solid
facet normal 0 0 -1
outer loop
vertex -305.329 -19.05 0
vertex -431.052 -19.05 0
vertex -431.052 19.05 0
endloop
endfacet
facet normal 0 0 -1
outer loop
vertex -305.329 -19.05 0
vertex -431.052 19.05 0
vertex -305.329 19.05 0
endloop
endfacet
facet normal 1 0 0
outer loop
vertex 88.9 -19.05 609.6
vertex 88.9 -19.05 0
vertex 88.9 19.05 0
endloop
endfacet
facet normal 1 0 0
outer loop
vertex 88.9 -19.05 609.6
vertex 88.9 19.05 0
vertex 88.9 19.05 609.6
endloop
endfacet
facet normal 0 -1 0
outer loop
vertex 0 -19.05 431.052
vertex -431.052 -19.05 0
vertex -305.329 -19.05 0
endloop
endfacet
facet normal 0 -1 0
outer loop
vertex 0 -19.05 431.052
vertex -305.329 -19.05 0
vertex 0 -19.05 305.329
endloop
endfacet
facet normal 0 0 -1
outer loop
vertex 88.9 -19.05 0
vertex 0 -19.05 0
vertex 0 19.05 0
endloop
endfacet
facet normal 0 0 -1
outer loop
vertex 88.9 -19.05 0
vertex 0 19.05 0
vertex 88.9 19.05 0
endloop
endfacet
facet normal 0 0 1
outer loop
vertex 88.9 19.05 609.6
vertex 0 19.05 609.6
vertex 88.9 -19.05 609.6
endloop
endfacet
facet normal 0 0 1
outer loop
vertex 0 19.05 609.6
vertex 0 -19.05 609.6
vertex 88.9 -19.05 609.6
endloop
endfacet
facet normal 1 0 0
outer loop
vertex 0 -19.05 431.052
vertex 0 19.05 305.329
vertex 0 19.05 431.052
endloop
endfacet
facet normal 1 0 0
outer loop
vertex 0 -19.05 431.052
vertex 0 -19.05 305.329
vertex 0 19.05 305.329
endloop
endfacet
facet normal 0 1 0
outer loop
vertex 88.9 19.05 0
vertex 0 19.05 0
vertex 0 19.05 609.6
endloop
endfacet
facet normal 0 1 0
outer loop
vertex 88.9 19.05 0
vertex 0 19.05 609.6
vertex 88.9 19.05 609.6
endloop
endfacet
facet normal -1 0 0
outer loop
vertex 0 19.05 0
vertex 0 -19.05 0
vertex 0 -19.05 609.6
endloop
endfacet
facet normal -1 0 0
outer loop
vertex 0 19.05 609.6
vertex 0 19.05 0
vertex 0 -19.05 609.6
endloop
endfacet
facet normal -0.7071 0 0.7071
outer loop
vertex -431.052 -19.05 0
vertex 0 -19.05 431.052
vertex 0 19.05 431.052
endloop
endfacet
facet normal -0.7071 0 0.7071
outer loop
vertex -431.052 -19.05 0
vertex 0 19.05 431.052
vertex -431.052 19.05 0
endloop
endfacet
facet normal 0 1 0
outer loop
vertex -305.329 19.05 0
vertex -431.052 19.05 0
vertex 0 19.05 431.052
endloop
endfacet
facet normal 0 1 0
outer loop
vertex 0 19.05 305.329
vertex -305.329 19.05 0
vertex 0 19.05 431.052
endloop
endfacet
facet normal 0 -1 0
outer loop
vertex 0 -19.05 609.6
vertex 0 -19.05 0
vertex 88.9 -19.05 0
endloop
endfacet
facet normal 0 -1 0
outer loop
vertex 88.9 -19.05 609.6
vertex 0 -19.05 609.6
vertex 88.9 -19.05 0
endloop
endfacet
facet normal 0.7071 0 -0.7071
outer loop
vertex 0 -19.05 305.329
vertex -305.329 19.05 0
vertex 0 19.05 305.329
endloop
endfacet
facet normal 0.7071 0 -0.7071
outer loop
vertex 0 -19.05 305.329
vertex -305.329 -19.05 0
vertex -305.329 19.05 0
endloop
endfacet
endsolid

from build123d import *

# Parameters (mm, degrees)
F0_W     = 88.9
F0_H     = 609.6
F1_DEPTH = 19.05
F3_DEPTH = 19.05


with BuildPart() as f1:
    # F0 (on Front) → F1 (new body, symmetric)
    with BuildSketch(Plane.XZ):
        with Locations((44.45, 304.8)):
            Rectangle(F0_W, F0_H)
    extrude(amount=F1_DEPTH, both=True)


with BuildPart() as f3:
    # F2 (on Front) → F3 (new body, symmetric)
    with BuildSketch(Plane.XZ):
        Polygon((0, 305.328708), (0, 431.052294), (-431.052294, 0), (-305.328708, 0), align=None)
    extrude(amount=F3_DEPTH, both=True)


solid = Compound([f1.part, f3.part])
